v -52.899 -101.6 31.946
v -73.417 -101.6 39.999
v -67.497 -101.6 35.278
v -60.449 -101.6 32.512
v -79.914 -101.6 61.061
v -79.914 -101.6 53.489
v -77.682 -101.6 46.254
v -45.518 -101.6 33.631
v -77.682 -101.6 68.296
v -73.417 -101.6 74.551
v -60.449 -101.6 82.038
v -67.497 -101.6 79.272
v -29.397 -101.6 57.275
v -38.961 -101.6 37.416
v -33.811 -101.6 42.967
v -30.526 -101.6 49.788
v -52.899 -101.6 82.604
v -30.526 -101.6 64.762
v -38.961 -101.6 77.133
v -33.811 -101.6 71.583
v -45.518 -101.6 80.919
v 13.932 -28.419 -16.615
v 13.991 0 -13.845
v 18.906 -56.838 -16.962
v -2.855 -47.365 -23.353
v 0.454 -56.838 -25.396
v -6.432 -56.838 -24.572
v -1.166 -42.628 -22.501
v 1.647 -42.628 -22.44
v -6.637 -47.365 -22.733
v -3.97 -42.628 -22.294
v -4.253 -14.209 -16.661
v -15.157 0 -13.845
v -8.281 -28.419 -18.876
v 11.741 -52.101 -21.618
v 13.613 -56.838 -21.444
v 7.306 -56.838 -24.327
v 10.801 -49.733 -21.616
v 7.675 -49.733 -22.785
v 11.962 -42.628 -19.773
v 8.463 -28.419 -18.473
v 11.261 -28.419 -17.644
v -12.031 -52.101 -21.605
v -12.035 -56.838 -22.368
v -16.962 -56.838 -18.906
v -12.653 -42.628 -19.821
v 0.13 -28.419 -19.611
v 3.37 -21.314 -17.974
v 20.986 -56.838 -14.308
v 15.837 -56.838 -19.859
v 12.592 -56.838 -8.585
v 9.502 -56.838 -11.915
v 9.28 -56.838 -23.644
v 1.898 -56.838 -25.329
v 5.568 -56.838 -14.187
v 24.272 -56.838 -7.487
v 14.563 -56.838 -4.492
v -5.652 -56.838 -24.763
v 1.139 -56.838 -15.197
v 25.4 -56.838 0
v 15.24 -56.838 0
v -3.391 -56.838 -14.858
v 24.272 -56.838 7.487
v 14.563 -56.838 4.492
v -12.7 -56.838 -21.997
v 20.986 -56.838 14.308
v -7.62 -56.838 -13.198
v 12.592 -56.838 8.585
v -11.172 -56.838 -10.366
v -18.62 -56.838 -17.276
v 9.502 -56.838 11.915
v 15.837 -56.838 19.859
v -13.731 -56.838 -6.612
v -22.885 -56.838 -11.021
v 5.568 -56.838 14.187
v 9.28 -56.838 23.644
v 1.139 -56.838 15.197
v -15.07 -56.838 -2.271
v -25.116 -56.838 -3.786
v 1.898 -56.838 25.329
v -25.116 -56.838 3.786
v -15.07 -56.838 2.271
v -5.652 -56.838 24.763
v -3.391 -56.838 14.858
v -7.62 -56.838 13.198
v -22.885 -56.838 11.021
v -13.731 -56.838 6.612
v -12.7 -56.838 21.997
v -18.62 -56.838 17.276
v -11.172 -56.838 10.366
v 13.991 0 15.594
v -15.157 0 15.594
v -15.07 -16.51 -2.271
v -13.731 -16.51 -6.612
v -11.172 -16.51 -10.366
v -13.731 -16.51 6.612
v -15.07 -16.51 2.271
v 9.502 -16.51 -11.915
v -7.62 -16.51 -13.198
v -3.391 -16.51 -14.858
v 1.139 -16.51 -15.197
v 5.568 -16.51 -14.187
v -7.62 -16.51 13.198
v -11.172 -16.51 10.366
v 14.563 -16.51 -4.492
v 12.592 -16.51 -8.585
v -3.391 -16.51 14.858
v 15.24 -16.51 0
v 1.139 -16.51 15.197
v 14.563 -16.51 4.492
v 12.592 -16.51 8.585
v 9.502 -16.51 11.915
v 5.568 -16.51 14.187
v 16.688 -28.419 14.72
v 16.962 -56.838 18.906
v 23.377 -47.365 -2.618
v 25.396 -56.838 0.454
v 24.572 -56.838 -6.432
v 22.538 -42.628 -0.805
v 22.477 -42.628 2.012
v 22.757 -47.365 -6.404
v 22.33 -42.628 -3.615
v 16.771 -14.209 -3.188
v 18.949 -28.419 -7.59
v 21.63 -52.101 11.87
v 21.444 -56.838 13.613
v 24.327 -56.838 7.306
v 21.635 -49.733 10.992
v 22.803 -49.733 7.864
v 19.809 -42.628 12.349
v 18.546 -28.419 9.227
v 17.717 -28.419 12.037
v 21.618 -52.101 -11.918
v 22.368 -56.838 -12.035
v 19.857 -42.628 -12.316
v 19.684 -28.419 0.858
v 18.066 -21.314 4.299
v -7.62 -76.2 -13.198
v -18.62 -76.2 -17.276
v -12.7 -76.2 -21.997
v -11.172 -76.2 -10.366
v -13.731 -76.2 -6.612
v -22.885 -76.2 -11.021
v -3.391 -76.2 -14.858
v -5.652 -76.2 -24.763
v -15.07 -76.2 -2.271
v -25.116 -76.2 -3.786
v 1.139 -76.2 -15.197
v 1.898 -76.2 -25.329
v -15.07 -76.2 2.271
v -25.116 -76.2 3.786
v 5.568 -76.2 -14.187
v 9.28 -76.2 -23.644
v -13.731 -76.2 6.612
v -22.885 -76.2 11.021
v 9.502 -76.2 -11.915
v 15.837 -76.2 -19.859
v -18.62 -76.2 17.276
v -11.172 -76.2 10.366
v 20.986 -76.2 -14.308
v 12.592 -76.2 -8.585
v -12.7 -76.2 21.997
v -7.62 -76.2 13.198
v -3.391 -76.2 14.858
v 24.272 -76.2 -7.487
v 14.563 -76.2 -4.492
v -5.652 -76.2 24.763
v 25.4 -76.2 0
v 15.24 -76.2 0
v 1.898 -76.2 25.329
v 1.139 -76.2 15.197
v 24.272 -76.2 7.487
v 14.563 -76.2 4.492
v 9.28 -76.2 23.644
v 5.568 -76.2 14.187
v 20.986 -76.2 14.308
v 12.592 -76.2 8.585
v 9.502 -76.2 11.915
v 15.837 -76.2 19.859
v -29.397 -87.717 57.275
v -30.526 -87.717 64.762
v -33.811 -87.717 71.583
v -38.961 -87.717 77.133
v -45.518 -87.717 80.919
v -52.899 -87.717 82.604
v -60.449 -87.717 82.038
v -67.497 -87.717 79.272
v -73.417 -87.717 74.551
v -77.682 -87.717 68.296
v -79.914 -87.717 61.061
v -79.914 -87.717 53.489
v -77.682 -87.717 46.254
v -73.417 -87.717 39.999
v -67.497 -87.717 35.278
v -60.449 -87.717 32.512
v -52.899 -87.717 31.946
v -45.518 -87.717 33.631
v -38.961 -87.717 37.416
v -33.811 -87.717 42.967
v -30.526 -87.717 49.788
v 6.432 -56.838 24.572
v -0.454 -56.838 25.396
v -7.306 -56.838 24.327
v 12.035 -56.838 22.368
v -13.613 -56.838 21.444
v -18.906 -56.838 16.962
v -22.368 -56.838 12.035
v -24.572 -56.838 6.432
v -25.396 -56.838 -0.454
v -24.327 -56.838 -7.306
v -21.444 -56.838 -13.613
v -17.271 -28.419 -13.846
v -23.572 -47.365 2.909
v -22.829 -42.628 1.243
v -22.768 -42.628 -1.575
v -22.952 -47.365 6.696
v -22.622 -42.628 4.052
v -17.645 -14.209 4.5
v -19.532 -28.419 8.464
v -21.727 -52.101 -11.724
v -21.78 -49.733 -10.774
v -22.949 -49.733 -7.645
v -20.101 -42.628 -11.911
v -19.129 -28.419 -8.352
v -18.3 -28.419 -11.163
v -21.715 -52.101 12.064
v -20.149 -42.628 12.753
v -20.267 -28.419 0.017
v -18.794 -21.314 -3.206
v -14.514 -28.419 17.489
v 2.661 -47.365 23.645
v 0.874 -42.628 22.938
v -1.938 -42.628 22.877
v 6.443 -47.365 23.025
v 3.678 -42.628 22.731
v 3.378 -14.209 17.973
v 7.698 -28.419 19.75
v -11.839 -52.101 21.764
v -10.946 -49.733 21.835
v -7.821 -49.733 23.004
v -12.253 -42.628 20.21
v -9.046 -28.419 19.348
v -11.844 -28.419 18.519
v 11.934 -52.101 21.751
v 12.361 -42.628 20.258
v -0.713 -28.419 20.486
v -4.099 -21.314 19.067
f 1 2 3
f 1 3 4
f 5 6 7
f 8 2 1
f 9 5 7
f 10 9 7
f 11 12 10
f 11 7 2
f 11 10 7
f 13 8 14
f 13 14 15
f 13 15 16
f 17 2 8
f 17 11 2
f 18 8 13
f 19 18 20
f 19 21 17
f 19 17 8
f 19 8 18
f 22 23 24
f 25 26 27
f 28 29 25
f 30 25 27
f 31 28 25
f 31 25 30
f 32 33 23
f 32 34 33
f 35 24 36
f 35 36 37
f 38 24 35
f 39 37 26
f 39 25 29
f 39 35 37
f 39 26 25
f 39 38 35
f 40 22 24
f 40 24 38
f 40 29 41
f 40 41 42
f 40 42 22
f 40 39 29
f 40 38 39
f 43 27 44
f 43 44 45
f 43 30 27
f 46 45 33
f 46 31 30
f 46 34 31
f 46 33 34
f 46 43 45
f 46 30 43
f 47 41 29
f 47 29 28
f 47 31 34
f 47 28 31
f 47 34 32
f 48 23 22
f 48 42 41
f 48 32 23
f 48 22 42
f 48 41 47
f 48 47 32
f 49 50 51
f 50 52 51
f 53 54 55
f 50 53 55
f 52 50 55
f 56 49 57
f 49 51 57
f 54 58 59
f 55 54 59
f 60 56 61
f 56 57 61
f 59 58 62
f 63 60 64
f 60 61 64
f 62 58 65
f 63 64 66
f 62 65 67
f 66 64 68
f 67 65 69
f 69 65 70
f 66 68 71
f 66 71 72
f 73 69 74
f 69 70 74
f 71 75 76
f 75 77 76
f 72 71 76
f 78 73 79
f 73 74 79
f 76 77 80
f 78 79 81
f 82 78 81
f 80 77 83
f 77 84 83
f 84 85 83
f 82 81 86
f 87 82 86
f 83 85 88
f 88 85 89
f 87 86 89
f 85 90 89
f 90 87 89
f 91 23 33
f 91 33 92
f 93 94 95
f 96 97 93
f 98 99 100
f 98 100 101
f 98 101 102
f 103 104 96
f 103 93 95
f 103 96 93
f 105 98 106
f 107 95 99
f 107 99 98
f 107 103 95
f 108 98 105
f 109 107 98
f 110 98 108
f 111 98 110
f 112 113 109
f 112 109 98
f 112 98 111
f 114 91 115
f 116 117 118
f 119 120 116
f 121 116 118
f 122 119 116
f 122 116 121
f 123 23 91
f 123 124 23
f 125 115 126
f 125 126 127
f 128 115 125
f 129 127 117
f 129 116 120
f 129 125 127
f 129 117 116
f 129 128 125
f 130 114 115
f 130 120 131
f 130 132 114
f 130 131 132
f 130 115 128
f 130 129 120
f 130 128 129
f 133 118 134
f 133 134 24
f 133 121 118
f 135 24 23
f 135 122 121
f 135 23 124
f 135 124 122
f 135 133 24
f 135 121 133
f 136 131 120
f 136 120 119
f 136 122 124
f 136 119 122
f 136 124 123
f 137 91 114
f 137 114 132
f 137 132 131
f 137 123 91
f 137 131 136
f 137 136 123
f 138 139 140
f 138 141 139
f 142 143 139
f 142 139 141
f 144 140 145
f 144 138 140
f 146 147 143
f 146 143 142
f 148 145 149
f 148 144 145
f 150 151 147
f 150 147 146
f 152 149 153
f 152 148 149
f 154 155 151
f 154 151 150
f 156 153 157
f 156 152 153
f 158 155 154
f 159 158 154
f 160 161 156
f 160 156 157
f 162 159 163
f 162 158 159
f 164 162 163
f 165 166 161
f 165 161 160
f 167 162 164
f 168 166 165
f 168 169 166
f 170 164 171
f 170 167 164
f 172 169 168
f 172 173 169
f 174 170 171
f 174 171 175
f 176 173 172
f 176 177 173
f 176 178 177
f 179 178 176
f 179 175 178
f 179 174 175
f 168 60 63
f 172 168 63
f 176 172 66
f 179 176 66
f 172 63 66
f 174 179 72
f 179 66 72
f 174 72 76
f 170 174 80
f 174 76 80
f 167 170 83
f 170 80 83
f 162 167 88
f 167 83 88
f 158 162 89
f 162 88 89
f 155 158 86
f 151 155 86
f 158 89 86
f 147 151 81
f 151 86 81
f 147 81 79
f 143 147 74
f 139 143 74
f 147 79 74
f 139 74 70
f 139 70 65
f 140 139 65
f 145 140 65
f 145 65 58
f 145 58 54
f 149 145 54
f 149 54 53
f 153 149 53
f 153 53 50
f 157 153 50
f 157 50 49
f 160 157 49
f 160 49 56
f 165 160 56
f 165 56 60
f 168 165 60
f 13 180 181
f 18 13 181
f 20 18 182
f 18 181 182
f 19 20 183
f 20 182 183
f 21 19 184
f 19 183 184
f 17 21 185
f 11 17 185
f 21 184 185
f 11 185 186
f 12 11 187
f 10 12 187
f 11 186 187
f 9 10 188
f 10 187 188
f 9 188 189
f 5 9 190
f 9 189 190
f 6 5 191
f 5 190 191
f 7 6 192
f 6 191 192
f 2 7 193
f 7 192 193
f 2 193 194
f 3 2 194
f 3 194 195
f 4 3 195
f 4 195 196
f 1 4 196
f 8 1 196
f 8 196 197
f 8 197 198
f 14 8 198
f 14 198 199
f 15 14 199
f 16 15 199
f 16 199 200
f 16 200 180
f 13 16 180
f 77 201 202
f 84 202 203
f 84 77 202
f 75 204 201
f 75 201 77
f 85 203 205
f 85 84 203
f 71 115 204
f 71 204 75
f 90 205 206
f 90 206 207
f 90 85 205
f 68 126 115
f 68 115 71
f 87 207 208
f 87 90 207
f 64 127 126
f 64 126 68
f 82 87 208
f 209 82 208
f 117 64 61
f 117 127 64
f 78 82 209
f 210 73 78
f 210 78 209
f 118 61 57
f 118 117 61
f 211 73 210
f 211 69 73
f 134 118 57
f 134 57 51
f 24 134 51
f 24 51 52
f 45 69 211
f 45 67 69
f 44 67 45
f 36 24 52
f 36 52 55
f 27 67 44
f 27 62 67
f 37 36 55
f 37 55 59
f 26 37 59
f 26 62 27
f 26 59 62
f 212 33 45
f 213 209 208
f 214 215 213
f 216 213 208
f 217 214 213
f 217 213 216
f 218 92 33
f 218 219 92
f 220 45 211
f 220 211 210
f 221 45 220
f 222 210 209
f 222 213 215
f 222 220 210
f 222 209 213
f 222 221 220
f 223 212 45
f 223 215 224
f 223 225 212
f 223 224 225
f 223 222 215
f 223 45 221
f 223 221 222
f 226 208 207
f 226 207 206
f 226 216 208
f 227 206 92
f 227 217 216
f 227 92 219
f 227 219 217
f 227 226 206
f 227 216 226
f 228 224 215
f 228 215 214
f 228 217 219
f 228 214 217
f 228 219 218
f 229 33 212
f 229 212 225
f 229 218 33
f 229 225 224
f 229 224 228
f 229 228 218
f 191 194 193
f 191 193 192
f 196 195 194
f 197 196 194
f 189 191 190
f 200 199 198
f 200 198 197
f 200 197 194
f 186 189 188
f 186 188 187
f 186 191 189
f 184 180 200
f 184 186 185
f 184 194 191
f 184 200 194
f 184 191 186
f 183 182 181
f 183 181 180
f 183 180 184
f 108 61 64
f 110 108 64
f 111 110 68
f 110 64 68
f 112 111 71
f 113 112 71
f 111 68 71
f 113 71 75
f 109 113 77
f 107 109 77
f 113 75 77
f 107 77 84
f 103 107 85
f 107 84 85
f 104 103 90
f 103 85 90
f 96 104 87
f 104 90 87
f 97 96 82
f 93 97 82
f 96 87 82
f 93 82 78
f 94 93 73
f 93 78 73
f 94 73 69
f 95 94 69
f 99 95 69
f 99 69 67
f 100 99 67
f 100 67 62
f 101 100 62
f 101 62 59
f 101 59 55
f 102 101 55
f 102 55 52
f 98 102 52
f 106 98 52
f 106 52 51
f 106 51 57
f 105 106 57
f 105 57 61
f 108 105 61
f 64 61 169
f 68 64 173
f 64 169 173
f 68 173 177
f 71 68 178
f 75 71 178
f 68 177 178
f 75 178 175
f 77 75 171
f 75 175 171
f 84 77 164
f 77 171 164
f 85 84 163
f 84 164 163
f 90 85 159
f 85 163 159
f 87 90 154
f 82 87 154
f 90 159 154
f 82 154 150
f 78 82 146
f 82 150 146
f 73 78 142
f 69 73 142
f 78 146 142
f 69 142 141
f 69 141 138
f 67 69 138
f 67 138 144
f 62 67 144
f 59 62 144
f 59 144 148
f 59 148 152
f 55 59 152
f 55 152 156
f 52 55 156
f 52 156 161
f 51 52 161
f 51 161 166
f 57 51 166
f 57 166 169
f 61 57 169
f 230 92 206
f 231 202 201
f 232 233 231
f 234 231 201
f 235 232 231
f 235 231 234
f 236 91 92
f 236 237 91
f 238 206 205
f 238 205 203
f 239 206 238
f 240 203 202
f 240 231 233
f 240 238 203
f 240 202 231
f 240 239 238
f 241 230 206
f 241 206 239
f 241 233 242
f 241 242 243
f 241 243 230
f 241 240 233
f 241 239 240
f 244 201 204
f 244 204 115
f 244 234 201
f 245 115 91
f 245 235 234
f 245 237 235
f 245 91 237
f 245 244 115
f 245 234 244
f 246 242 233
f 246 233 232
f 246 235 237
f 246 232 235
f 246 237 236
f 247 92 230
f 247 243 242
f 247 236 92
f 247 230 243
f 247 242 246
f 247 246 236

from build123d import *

# Parameters (mm, degrees)
F0_R          = 25.4
F1_DEPTH      = 76.2
F2_W          = 59.7524605691
F2_H          = 58.5865583271
F3_DEPTH      = 43.434
F3_DEPTH_BACK = 30.226
F4_W          = 29.1475430131
F4_H          = 29.4390162453
F6_R          = 15.24
F7_DEPTH      = 59.69
F8_R          = 25.4
F9_DEPTH      = 101.6
F10_W         = 93.4799709357
F10_H         = 55.210987106
F11_DEPTH     = 89.916


# Not quite as in the source:
# - the arcs of a loft's sections are written as splines that run evenly, so that the points pair up as in the source's solid


with BuildPart() as f1:
    # F0 (on Front) → F1 (new body)
    with BuildSketch(Plane.XZ):
        Circle(F0_R)
    extrude(amount=F1_DEPTH)

    # F2 (on Right) → F3 (cut, two sides)
    with BuildSketch(Plane.YZ) as f3_sk:
        with Locations((-26.9614737481, -0.2914750949)):
            Rectangle(F2_W, F2_H)
    extrude(amount=-F3_DEPTH, mode=Mode.SUBTRACT)
    extrude(f3_sk.sketch, amount=F3_DEPTH_BACK, mode=Mode.SUBTRACT)


with BuildPart() as f5:
    # F3_face (on face) → F5 section 0
    with BuildSketch(Plane(origin=(0, -56.8377040327, 0), x_dir=(-1, 0, 0), z_dir=(0, 1, 0))):
        with BuildLine():
            add(Edge.make_bspline(
                [(-16.9623986454, 18.9060051887), (-18.1997937915, 17.7958187934), (-19.3278172281, 16.5637900788), (-21.321881876, 13.9032734939), (-22.18787378, 12.4748514101), (-23.6245819975, 9.4764331911), (-24.1952627855, 7.9065111976), (-25.0194026816, 4.6854188751), (-25.2728414111, 3.0343281939), (-25.4527417517, -0.2856534605), (-25.3791989144, -1.9544623407), (-24.9079462304, -5.2457482939), (-24.5102480363, -6.8681439836), (-23.405952304, -10.0042519622), (-22.6993820716, -11.5178867049), (-21.0044807567, -14.3782978381), (-20.0161915839, -15.7250034994), (-18.9060051887, -16.9623986454)],
                knots=[0, 0, 0, 0, 0.125, 0.125, 0.25, 0.25, 0.375, 0.375, 0.5, 0.5, 0.625, 0.625, 0.75, 0.75, 0.875, 0.875, 1, 1, 1, 1], degree=3))
            add(Edge.make_bspline(
                [(-18.9060051887, -16.9623986454), (-17.7958187934, -18.1997937915), (-16.5637900788, -19.3278172281), (-13.9032734939, -21.321881876), (-12.4748514101, -22.18787378), (-9.4764331911, -23.6245819975), (-7.9065111976, -24.1952627855), (-4.6854188751, -25.0194026816), (-3.0343281939, -25.2728414111), (0.2856534605, -25.4527417517), (1.9544623407, -25.3791989144), (5.2457482939, -24.9079462304), (6.8681439836, -24.5102480363), (10.0042519622, -23.405952304), (11.5178867049, -22.6993820716), (14.3782978381, -21.0044807567), (15.7250034994, -20.0161915839), (16.9623986454, -18.9060051887)],
                knots=[0, 0, 0, 0, 0.125, 0.125, 0.25, 0.25, 0.375, 0.375, 0.5, 0.5, 0.625, 0.625, 0.75, 0.75, 0.875, 0.875, 1, 1, 1, 1], degree=3))
            add(Edge.make_bspline(
                [(16.9623986454, -18.9060051887), (18.1997937915, -17.7958187934), (19.3278172281, -16.5637900788), (21.321881876, -13.9032734939), (22.18787378, -12.4748514101), (23.6245819975, -9.4764331911), (24.1952627855, -7.9065111976), (25.0194026816, -4.6854188751), (25.2728414111, -3.0343281939), (25.4527417517, 0.2856534605), (25.3791989144, 1.9544623407), (24.9079462304, 5.2457482939), (24.5102480363, 6.8681439836), (23.405952304, 10.0042519622), (22.6993820716, 11.5178867049), (21.0044807567, 14.3782978381), (20.0161915839, 15.7250034994), (18.9060051887, 16.9623986454)],
                knots=[0, 0, 0, 0, 0.125, 0.125, 0.25, 0.25, 0.375, 0.375, 0.5, 0.5, 0.625, 0.625, 0.75, 0.75, 0.875, 0.875, 1, 1, 1, 1], degree=3))
            add(Edge.make_bspline(
                [(18.9060051887, 16.9623986454), (17.7958187934, 18.1997937915), (16.5637900788, 19.3278172281), (13.9032734939, 21.321881876), (12.4748514101, 22.18787378), (9.4764331911, 23.6245819975), (7.9065111976, 24.1952627855), (4.6854188751, 25.0194026816), (3.0343281939, 25.2728414111), (-0.2856534605, 25.4527417517), (-1.9544623407, 25.3791989144), (-5.2457482939, 24.9079462304), (-6.8681439836, 24.5102480363), (-10.0042519622, 23.405952304), (-11.5178867049, 22.6993820716), (-14.3782978381, 21.0044807567), (-15.7250034994, 20.0161915839), (-16.9623986454, 18.9060051887)],
                knots=[0, 0, 0, 0, 0.125, 0.125, 0.25, 0.25, 0.375, 0.375, 0.5, 0.5, 0.625, 0.625, 0.75, 0.75, 0.875, 0.875, 1, 1, 1, 1], degree=3))
        make_face()
    # F4 (on Front) → F5 section 1
    with BuildSketch(Plane.XZ):
        with Locations((-0.582951121, 0.8744257502)):
            Rectangle(F4_W, F4_H)
    loft(ruled=True)


with BuildPart() as f7_tool:
    # F6 (on face) → F7 (new body)
    with BuildSketch(Plane.XZ.offset(76.2)):
        Circle(F6_R)
    extrude(amount=-F7_DEPTH)


with BuildPart() as f1_1:
    add(f1.part)

    # F7: cut by f7_tool
    add(f7_tool.part, mode=Mode.SUBTRACT)


with BuildPart() as f5_1:
    add(f5.part)

    # F7: cut by f7_tool
    add(f7_tool.part, mode=Mode.SUBTRACT)


with BuildPart() as f9:
    # F8 (on Front) → F9 (new body)
    with BuildSketch(Plane.XZ):
        with Locations((-54.7973774374, 57.2749190032)):
            Circle(F8_R)
    extrude(amount=F9_DEPTH)

    # F10 (on Right) → F11 (cut)
    with BuildSketch(Plane.YZ):
        with Locations((-40.9772868734, 56.4336283132)):
            Rectangle(F10_W, F10_H)
    extrude(amount=-F11_DEPTH, mode=Mode.SUBTRACT)


solid = Compound([f1_1.part, f5_1.part, f9.part])
